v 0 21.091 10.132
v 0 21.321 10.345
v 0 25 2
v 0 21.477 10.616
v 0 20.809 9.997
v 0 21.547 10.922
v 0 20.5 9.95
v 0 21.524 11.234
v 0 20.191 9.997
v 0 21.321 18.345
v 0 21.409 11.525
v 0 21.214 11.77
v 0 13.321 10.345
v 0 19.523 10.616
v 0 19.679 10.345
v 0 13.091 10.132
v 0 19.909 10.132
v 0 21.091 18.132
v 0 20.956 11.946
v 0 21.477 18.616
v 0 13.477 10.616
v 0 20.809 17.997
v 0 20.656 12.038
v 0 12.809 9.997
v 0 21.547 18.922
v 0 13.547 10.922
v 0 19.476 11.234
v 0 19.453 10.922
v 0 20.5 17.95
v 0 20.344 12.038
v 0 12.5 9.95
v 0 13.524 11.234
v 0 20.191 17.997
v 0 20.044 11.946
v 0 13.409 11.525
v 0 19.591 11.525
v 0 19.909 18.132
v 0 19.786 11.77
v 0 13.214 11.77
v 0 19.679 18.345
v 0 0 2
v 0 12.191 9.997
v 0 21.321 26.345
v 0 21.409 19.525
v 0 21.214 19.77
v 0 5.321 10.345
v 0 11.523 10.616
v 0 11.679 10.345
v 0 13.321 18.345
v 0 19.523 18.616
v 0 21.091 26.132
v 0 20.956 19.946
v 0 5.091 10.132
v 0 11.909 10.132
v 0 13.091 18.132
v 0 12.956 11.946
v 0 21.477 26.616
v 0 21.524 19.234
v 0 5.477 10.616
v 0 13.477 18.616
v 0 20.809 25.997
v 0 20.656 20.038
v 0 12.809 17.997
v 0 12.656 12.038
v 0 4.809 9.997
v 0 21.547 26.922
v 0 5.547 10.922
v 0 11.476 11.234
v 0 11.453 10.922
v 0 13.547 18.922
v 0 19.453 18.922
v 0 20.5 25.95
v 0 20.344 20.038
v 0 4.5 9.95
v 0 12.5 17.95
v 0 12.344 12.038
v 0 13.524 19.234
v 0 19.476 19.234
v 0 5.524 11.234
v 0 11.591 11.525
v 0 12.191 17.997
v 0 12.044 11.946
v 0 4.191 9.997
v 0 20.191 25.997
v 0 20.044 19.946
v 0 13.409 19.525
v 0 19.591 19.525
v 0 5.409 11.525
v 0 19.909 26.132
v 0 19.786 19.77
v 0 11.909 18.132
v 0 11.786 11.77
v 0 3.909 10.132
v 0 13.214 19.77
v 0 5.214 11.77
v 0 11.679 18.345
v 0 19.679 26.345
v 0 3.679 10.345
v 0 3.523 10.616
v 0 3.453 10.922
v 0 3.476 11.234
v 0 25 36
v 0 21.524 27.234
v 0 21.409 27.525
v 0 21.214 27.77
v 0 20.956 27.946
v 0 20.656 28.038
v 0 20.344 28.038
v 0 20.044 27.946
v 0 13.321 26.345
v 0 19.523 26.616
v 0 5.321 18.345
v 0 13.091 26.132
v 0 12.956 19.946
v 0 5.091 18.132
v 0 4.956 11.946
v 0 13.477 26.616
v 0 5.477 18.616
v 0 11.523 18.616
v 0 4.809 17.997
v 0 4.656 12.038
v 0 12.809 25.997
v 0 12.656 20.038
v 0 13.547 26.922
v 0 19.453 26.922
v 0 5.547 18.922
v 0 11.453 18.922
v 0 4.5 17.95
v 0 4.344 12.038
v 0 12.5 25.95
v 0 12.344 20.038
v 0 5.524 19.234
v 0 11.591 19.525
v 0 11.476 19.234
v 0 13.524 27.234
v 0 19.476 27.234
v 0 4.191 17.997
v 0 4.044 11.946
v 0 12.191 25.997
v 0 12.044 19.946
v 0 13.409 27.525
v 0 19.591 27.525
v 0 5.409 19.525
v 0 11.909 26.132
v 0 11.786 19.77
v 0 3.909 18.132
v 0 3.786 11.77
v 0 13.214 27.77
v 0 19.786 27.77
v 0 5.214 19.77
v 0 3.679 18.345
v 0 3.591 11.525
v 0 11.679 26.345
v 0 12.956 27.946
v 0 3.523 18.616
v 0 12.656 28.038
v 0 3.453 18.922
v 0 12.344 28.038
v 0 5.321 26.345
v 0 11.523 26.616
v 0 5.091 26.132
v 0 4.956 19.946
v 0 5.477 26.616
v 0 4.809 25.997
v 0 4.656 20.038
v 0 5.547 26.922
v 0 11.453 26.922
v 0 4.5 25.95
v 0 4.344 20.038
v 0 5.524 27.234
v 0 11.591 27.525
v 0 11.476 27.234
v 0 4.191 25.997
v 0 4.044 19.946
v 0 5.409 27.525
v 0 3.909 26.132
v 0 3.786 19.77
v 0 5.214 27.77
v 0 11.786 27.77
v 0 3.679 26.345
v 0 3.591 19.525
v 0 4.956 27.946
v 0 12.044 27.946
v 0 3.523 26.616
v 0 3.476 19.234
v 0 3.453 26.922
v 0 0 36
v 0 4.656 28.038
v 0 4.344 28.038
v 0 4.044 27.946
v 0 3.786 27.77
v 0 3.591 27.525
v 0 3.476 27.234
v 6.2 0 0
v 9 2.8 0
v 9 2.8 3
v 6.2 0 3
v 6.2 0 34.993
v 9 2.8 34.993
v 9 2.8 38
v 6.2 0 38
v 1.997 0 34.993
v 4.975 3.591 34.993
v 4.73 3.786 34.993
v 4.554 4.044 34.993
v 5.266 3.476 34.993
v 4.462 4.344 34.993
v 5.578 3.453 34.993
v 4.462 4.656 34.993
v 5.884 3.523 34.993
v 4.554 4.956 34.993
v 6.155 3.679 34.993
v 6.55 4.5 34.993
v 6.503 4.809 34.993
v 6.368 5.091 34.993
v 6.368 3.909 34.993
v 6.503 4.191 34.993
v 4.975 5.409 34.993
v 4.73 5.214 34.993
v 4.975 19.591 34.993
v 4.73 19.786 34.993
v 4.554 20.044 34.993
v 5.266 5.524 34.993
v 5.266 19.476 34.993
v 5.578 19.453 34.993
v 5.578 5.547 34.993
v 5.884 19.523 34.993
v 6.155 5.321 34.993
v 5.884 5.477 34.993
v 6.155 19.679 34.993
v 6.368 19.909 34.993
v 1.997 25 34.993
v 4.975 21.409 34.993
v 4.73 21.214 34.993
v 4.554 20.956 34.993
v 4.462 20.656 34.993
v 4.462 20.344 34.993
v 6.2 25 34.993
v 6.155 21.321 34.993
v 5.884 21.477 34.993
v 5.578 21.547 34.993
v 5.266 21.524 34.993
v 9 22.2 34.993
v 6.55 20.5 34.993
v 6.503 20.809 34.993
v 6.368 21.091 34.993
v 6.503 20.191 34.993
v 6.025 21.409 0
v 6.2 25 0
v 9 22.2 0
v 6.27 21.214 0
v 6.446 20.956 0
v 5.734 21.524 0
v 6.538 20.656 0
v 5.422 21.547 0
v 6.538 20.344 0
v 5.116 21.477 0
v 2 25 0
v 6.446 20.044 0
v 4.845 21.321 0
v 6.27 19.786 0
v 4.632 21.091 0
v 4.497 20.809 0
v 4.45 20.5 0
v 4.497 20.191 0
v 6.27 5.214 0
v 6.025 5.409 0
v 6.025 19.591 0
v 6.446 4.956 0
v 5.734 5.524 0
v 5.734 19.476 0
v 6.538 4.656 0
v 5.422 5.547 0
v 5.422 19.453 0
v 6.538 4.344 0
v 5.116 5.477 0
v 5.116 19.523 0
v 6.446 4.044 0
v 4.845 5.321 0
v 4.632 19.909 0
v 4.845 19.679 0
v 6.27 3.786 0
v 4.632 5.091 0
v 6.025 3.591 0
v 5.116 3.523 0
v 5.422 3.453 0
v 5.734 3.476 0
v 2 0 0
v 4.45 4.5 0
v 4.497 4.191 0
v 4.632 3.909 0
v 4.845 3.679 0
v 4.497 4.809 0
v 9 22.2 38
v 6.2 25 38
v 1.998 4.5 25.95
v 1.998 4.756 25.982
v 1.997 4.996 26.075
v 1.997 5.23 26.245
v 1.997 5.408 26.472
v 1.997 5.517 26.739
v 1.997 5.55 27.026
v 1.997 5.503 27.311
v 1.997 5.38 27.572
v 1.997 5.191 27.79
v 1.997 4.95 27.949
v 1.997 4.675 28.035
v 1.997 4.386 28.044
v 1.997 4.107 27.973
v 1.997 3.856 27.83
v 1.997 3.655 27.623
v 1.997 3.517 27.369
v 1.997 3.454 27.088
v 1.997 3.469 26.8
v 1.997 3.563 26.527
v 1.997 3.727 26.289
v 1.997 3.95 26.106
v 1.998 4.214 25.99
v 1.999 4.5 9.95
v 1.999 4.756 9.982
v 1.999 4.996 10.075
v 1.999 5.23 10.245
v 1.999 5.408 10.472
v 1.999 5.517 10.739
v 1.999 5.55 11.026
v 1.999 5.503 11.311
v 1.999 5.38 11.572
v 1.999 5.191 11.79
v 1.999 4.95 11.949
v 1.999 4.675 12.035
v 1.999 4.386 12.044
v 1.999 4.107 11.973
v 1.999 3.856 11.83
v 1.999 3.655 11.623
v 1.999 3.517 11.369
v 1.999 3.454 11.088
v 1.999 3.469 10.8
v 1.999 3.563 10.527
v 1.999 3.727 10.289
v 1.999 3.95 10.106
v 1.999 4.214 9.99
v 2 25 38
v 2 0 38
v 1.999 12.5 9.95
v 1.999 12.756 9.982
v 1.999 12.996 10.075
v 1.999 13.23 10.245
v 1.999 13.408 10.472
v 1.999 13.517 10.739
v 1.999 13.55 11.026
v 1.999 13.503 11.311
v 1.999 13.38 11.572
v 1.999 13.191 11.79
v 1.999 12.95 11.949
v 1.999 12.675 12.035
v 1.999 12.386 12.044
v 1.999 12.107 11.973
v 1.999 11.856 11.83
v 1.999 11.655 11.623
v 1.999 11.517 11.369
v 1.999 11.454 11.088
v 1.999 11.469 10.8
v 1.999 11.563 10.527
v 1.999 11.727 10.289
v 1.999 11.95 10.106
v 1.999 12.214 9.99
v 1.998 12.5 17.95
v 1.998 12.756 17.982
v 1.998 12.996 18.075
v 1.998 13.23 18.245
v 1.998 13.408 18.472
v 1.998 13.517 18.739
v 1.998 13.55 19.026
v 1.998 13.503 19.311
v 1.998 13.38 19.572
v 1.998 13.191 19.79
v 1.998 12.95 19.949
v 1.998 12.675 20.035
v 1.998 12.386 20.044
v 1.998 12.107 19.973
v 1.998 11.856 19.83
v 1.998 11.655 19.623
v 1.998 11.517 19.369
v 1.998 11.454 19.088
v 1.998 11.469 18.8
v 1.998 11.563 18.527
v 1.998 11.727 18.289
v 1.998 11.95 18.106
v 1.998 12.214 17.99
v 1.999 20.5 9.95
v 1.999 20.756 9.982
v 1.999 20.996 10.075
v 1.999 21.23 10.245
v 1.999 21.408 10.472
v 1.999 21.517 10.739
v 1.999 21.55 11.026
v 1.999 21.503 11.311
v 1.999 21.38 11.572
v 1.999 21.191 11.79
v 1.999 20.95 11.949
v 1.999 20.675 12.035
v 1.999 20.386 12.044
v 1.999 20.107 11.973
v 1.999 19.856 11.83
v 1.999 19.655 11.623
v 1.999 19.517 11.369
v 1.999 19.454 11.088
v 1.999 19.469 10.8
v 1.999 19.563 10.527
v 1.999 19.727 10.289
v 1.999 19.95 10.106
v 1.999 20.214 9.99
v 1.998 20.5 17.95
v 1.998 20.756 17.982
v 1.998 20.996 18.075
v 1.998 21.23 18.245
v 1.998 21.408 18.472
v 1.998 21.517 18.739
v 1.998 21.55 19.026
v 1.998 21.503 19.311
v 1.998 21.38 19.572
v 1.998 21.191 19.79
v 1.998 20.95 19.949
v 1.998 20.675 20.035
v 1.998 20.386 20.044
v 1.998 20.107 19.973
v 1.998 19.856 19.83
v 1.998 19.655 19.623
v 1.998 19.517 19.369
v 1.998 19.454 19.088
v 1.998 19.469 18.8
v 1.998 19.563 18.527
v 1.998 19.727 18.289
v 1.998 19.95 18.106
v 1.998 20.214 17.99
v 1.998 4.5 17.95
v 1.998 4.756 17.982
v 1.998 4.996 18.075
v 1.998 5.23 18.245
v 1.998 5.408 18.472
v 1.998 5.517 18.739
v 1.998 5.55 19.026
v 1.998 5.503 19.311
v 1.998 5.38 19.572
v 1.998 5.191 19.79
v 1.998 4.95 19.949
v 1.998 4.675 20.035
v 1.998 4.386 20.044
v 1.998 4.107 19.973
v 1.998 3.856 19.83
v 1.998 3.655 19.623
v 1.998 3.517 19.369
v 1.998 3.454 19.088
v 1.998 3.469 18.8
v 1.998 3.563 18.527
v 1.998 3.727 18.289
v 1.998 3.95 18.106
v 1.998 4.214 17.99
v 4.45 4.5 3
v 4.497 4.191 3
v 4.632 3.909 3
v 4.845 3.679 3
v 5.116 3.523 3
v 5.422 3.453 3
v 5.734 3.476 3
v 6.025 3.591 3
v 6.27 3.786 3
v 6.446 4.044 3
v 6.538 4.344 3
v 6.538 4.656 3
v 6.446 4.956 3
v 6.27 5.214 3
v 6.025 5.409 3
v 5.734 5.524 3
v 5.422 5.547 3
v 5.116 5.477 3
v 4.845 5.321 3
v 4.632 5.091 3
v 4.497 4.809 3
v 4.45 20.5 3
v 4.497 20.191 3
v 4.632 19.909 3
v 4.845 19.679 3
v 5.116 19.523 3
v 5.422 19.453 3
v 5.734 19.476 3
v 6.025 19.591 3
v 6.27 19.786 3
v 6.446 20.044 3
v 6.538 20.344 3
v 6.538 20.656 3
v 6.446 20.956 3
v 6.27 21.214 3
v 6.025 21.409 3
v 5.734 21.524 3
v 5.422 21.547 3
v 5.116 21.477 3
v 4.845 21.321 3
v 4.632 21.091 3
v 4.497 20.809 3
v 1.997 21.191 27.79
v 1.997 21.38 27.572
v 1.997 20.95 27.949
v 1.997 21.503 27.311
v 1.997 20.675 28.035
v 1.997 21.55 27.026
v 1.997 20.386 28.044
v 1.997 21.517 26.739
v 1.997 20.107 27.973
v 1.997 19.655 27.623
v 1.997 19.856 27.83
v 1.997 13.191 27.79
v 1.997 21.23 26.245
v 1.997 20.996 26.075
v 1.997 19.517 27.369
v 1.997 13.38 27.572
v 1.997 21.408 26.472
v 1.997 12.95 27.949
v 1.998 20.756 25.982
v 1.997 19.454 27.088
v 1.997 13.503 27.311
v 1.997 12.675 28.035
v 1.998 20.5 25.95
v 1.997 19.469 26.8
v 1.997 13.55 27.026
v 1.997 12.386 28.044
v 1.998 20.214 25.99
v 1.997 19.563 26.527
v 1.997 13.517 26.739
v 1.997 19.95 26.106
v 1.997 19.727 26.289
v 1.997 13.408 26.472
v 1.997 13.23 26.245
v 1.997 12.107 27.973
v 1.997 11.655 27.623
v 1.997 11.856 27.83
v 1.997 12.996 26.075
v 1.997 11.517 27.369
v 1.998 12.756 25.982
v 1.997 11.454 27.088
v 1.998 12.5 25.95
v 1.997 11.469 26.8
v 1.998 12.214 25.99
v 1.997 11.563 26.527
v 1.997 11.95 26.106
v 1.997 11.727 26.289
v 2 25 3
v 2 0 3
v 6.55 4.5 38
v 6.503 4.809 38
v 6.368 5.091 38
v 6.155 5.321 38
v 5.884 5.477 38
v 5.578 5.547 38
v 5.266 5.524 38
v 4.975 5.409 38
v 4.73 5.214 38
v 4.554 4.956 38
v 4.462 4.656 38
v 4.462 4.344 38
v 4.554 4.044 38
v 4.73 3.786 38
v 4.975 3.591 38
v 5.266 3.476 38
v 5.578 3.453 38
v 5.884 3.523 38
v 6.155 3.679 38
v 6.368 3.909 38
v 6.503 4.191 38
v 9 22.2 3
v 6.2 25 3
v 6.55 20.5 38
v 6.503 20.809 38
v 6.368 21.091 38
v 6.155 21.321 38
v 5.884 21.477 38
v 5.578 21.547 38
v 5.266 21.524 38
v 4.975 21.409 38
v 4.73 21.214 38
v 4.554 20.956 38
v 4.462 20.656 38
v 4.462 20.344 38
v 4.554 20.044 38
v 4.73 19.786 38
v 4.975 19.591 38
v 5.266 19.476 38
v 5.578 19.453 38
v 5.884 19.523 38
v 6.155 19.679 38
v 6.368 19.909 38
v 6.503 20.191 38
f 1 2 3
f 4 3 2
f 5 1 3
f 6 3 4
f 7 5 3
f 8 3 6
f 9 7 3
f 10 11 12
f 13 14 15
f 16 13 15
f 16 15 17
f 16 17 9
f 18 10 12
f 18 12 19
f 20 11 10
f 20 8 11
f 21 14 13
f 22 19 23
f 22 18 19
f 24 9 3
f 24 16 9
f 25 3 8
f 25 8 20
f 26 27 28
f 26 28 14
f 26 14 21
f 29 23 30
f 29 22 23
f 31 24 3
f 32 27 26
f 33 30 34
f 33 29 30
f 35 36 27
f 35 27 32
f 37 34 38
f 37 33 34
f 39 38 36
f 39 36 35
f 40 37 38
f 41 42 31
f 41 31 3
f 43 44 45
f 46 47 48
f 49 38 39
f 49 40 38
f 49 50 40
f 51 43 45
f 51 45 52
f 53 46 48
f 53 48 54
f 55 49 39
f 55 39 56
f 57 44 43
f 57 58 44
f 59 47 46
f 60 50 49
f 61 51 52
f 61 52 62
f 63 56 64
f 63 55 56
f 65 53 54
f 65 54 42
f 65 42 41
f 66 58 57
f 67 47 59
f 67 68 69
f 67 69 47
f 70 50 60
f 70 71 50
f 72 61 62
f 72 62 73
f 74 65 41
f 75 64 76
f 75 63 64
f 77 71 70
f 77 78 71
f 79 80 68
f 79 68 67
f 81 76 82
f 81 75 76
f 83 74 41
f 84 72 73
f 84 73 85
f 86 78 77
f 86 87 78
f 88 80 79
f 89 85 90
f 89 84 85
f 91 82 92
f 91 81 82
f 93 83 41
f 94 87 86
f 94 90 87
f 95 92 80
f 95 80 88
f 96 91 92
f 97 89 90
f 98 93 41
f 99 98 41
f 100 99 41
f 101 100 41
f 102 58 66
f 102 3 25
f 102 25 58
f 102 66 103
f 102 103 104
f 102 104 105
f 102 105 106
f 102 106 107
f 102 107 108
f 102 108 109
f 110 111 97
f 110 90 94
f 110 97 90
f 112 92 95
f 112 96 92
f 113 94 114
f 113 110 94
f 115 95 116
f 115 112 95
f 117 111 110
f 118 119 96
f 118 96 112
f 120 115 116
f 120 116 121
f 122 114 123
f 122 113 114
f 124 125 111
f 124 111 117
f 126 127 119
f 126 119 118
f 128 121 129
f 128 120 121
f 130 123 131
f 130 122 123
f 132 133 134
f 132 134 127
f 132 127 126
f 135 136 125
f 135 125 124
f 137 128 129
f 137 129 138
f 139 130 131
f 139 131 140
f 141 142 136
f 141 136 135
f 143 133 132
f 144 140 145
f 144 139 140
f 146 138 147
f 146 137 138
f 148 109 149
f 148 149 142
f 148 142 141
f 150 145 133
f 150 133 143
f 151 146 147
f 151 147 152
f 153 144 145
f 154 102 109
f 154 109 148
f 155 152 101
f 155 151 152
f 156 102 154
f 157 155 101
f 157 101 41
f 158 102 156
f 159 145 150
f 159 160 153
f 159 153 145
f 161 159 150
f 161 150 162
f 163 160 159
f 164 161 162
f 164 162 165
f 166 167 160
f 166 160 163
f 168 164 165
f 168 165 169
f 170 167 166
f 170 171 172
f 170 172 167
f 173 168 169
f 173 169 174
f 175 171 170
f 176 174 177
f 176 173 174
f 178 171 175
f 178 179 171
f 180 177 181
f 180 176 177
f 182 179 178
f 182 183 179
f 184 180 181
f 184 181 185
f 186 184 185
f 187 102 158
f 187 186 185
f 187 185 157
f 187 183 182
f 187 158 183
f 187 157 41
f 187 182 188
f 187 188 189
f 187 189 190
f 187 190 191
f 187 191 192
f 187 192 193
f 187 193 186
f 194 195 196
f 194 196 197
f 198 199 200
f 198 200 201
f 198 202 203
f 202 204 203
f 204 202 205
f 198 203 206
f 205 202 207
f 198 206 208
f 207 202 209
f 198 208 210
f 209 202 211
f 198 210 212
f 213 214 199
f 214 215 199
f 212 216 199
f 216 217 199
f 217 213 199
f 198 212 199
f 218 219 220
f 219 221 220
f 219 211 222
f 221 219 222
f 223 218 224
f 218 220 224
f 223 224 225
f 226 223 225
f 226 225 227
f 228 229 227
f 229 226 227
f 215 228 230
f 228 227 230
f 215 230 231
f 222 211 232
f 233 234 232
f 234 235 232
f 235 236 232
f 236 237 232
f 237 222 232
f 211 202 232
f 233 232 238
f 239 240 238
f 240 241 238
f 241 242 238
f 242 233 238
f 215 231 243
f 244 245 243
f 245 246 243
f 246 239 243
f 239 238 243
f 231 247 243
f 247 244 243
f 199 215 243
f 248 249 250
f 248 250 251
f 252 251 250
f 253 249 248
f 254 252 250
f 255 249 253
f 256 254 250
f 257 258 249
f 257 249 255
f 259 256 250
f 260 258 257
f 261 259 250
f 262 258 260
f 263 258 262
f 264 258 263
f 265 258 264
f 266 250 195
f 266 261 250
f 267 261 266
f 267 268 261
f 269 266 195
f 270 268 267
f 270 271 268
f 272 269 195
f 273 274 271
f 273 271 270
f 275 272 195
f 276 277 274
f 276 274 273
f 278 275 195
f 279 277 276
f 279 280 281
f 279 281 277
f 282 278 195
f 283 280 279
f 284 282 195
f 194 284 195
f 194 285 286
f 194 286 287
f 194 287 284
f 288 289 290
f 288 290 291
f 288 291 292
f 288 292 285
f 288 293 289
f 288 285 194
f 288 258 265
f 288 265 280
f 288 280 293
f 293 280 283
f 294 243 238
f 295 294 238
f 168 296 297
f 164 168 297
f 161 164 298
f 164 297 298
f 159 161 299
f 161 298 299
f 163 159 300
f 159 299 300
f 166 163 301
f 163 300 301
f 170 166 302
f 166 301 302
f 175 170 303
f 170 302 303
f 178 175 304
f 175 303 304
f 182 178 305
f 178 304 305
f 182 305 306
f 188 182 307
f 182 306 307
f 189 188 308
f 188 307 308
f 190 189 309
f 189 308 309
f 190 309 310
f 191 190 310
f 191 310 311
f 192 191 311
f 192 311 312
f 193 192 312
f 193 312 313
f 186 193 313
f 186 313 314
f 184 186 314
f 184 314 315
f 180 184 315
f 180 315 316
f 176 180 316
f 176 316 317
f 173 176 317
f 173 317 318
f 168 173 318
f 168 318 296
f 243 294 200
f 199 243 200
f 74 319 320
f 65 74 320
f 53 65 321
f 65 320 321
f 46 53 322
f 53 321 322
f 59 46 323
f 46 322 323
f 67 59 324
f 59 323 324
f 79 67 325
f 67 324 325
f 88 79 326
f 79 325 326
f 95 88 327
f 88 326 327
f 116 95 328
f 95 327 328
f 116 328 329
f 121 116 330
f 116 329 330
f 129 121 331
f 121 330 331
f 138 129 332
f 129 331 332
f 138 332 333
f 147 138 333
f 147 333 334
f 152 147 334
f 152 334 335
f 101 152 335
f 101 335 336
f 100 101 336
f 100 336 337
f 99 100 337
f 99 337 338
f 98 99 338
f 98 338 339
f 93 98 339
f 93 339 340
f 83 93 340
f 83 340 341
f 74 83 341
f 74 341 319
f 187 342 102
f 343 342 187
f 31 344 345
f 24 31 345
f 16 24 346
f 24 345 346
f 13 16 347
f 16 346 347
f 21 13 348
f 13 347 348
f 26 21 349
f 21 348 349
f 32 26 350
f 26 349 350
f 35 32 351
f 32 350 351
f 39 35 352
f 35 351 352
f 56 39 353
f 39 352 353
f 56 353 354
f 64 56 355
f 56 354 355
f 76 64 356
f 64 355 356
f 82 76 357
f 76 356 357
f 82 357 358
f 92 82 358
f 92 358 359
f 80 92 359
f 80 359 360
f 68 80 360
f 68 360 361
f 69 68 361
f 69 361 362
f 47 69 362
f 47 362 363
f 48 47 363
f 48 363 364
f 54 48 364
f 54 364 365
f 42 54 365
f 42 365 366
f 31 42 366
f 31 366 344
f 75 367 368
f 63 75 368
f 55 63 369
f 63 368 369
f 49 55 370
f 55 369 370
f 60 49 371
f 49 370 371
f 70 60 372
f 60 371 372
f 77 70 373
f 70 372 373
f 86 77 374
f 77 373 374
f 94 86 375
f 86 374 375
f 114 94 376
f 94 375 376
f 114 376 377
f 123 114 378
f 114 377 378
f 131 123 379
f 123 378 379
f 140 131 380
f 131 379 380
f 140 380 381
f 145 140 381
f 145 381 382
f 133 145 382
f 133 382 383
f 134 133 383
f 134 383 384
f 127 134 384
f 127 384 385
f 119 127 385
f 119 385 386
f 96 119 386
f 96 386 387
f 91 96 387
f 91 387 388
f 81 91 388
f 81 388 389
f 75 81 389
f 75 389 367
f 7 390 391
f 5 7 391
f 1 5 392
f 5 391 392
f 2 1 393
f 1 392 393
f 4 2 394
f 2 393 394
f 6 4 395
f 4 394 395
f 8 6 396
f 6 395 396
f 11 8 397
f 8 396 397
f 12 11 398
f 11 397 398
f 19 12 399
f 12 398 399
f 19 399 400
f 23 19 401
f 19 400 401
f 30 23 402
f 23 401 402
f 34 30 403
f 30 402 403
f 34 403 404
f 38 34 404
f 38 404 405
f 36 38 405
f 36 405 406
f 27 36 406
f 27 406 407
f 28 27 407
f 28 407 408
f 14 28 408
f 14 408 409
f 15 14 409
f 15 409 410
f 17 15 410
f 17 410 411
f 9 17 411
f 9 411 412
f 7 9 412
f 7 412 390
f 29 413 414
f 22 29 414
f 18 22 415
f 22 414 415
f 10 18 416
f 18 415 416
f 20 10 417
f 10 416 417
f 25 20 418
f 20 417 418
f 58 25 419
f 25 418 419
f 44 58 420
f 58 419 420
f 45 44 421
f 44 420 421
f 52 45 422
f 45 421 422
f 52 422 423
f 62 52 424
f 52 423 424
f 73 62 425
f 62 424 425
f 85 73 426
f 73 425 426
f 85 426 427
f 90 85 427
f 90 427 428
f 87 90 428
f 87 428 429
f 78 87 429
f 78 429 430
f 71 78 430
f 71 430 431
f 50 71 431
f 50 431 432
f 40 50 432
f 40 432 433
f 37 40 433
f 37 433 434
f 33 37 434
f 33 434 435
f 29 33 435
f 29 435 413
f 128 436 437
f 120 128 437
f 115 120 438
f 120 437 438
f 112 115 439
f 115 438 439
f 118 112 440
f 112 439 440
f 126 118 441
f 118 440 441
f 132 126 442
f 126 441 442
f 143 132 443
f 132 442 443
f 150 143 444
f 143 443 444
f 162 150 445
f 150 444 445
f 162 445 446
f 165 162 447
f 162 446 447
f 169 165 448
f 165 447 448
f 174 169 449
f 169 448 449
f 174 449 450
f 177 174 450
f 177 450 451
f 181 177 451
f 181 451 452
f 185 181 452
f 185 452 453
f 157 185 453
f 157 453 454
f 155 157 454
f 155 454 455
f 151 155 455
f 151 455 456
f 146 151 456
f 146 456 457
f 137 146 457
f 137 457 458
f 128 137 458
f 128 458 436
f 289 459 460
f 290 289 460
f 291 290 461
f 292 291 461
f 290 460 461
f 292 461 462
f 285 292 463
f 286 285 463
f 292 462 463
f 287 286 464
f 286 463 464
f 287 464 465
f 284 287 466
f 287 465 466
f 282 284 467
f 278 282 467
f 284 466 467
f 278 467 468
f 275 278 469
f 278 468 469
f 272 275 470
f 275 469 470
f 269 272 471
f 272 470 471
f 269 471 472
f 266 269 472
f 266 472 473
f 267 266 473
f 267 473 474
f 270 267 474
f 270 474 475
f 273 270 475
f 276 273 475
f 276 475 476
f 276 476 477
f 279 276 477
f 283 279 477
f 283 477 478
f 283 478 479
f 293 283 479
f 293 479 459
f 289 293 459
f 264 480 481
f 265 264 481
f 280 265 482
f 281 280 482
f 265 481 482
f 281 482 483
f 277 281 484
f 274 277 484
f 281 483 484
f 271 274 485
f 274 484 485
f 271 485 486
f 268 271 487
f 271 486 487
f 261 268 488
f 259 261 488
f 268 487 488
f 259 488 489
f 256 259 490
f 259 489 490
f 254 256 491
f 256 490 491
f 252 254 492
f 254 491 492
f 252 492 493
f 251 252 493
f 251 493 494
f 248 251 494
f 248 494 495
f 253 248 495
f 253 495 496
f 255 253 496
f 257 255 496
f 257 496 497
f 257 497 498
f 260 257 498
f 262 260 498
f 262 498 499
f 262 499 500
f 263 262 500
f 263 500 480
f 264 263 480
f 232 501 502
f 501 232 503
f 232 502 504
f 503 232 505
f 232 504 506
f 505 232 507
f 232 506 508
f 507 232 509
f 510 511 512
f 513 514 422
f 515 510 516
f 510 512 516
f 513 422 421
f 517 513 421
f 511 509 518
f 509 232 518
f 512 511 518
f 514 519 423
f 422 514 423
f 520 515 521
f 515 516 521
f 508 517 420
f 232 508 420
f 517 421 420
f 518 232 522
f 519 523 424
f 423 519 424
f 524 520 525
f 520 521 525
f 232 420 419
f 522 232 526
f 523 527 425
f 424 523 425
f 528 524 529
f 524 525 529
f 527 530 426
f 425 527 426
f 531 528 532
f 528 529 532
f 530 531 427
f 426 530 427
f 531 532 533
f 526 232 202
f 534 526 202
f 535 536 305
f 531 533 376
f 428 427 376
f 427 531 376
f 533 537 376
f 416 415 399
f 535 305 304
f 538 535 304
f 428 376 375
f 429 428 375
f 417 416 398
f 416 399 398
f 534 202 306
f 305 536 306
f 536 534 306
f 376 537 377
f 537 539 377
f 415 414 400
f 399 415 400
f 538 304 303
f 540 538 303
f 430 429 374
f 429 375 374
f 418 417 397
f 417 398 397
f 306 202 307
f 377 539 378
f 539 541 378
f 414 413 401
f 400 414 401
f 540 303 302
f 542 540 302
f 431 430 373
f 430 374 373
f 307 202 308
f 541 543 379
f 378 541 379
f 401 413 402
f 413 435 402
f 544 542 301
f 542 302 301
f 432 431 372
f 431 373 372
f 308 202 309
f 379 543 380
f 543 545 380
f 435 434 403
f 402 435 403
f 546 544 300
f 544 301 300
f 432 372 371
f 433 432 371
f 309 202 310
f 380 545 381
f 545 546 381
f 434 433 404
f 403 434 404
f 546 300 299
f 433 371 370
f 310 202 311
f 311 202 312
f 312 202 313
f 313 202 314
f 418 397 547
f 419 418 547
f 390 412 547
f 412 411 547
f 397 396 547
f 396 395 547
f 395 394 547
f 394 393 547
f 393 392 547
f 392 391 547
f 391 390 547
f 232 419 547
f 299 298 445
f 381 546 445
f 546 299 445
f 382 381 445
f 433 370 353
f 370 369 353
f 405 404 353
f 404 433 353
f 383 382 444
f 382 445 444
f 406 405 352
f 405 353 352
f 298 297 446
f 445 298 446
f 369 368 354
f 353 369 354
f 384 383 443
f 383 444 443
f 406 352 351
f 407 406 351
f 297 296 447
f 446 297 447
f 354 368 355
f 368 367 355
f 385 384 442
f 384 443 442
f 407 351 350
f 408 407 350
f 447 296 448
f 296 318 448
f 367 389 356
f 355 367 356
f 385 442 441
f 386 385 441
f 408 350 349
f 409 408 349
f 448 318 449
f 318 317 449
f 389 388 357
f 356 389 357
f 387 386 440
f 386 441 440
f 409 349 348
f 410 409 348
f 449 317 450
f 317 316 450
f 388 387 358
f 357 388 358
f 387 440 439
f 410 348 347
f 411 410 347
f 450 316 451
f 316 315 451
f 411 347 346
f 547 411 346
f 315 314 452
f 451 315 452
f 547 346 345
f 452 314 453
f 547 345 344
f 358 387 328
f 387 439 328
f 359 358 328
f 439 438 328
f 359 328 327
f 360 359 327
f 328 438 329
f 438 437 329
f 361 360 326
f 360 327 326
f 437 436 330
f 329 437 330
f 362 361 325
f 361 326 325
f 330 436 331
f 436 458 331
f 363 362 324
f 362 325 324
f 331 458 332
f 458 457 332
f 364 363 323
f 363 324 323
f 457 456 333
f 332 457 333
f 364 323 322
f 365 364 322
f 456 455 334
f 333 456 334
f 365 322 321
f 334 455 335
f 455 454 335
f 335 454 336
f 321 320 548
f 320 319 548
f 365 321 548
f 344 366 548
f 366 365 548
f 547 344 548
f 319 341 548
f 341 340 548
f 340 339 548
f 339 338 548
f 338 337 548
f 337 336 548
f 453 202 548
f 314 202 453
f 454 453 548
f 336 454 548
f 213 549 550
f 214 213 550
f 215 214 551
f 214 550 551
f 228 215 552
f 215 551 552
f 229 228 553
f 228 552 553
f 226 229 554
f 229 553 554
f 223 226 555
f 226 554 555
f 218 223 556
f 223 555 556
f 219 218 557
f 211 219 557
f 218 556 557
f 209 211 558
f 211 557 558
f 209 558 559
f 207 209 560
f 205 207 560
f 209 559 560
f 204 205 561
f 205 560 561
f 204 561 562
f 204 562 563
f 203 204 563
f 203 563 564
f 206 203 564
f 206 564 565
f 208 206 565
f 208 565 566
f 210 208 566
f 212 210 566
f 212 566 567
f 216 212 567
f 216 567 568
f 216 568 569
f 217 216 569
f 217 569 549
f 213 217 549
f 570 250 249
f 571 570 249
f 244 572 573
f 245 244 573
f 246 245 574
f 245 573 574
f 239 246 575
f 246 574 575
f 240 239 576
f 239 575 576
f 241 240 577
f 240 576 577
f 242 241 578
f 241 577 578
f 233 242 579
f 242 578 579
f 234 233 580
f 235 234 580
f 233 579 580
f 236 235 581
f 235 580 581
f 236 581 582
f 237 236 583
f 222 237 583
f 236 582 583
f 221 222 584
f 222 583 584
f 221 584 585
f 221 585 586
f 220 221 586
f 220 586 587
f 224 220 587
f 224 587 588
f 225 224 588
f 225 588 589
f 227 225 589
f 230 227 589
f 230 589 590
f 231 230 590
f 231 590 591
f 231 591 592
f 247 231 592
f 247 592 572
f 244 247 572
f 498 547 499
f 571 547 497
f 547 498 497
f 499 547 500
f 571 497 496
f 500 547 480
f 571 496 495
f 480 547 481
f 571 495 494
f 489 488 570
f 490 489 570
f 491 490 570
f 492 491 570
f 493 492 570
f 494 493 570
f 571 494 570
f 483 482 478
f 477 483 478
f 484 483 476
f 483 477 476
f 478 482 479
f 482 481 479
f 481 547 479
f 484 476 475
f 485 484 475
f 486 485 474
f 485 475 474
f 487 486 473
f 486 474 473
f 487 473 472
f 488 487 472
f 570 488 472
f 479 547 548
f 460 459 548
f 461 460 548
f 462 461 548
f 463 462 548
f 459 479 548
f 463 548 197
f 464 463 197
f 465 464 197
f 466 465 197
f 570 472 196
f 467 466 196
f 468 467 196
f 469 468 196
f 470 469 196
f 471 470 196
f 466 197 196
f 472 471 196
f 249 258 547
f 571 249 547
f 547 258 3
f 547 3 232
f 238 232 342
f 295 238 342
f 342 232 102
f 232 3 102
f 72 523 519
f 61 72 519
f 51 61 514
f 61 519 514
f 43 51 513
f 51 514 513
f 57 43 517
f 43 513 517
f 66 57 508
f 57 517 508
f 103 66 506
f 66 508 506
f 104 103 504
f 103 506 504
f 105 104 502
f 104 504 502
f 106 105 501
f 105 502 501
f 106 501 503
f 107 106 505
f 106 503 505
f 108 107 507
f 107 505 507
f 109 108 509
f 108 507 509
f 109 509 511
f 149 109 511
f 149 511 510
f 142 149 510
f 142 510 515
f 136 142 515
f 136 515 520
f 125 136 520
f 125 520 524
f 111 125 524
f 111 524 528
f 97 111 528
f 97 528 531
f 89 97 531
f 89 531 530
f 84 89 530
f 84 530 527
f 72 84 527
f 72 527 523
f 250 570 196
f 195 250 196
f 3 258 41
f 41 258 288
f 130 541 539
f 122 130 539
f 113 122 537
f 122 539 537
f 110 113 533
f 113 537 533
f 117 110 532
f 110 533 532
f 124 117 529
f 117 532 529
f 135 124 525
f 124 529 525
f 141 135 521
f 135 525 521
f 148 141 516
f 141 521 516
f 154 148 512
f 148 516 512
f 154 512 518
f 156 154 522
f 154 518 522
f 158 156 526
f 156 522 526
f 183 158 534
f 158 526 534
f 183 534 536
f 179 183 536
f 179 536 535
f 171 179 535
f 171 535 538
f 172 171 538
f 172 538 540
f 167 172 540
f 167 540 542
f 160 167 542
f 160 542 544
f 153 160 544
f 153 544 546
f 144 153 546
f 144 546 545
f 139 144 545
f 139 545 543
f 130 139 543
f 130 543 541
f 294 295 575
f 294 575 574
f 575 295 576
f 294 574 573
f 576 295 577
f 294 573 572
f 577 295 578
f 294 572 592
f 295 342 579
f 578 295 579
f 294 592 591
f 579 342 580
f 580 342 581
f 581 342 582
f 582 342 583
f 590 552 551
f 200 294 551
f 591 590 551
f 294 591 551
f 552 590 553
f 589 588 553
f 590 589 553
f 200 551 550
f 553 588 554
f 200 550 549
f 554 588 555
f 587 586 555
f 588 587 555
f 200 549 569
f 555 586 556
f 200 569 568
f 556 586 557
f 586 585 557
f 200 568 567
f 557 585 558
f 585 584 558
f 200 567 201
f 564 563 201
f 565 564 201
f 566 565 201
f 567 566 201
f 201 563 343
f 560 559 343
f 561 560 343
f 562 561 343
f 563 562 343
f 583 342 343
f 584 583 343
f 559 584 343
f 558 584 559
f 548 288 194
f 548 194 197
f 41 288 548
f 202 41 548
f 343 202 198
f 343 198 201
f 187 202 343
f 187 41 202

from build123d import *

# Parameters (mm, degrees)
SKETCH_1_W                  = 25
SKETCH_1_H                  = 38
EXTRUDE_1_DEPTH             = 9
CUT_EXTRUDE_1_DEPTH         = 47.368092477
HOLE_WIZARD_2_1_2_1_1_D     = 2.1
HOLE_WIZARD_2_1_2_1_1_DEPTH = 9
HOLE_WIZARD_2_1_2_1_2_D     = 2.1
HOLE_WIZARD_2_1_2_1_2_DEPTH = 9
HOLE_WIZARD_2_1_2_1_3_D     = 2.1
HOLE_WIZARD_2_1_2_1_3_DEPTH = 9
HOLE_WIZARD_2_1_2_1_4_D     = 2.1
HOLE_WIZARD_2_1_2_1_4_DEPTH = 3.007193387
CHAMFER_1_SIZE              = 2
SKETCH_12_R                 = 1.05
CUT_EXTRUDE_2_DEPTH         = 10
SKETCH_15_R                 = 1.05
CUT_EXTRUDE_3_DEPTH         = 10
CUT_EXTRUDE_4_DEPTH         = 47.368092478
CUT_EXTRUDE_5_DEPTH         = 47.368092477
CUT_EXTRUDE_5_DEPTH_BACK    = 47.368092477


with BuildPart() as part:
    # 草图1 → 凸台-拉伸1 (new body)
    with BuildSketch(Plane(origin=(0, 0, 0), x_dir=(0, -1, 0), z_dir=(-1, 0, 0))):
        with Locations((-12.5, 19)):
            Rectangle(SKETCH_1_W, SKETCH_1_H)
    extrude(amount=-EXTRUDE_1_DEPTH)

    # 草图2 → 切除-拉伸1 (cut, through all)
    with BuildSketch(Plane(origin=(0, 25, 0), x_dir=(-1, 0, 0), z_dir=(0, 1, 0))):
        Polygon((-9, 3), (-4, 3), (-3.996522166, 5.080336705), (-3.996522166, 33.000000217), (-3.996522166, 34.992806613), (-9, 34.992806613), align=None)
    extrude(amount=-CUT_EXTRUDE_1_DEPTH, mode=Mode.SUBTRACT)

    # Ø2.1 (2.1) 直径孔1
    with Locations(Plane.ZY):
        with Locations((11, 4.5)):
            Hole(HOLE_WIZARD_2_1_2_1_1_D / 2, depth=HOLE_WIZARD_2_1_2_1_1_DEPTH)

    # Ø2.1 (2.1) 直径孔2
    with Locations(Plane.ZY):
        with Locations((19, 4.5)):
            Hole(HOLE_WIZARD_2_1_2_1_2_D / 2, depth=HOLE_WIZARD_2_1_2_1_2_DEPTH)

    # Ø2.1 (2.1) 直径孔3
    with Locations(Plane.ZY):
        with Locations((27, 4.5), (27, 12.5), (27, 20.5), (11, 12.5), (11, 20.5), (19, 20.5), (19, 12.5)):
            Hole(HOLE_WIZARD_2_1_2_1_3_D / 2, depth=HOLE_WIZARD_2_1_2_1_3_DEPTH)

    # Ø2.1 (2.1) 直径孔4
    with Locations(Plane(origin=(0, 0, 34.992806613), x_dir=(-1, 0, 0), z_dir=(0, 0, -1))):
        with Locations((-5.5, 4.5), (-5.5, 20.5)):
            Hole(HOLE_WIZARD_2_1_2_1_4_D / 2, depth=HOLE_WIZARD_2_1_2_1_4_DEPTH)

    # 倒角1
    chamfer_1_edges = [part.edges().sort_by_distance(p)[0] for p in [
        (0, 12.5, 0),
        (0, 12.5, 38),
    ]]
    chamfer(chamfer_1_edges, length=CHAMFER_1_SIZE)

    # 草图12 → 切除-拉伸2 (cut)
    with BuildSketch(Plane.XY.offset(3)):
        with Locations(Location((5.5, 4.5, 0), (0, 0, 180))):
            Circle(SKETCH_12_R)
    extrude(amount=-CUT_EXTRUDE_2_DEPTH, mode=Mode.SUBTRACT)

    # 草图15 → 切除-拉伸3 (cut)
    with BuildSketch(Plane.XY.offset(3)):
        with Locations(Location((5.5, 20.5, 0), (0, 0, 180))):
            Circle(SKETCH_15_R)
    extrude(amount=-CUT_EXTRUDE_3_DEPTH, mode=Mode.SUBTRACT)

    # 草图16 → 切除-拉伸4 (cut, through all)
    with BuildSketch(Plane.XZ):
        Polygon((3.996522166, 34.992806613), (1.996522166, 34.992806613), (2, 3), (4, 3), align=None)
    extrude(amount=-CUT_EXTRUDE_4_DEPTH, mode=Mode.SUBTRACT)

    # 草图17 → 切除-拉伸5 (cut, two sides: drawn at the far end of the back side and taken through both)
    with BuildSketch(Plane.XY.offset(38).offset(-CUT_EXTRUDE_5_DEPTH_BACK)):
        Polygon((9, 22.2), (6.2, 25), (9, 25), align=None)
        Polygon((9, 0), (9, 2.8), (6.2, 0), align=None)
    extrude(amount=CUT_EXTRUDE_5_DEPTH + CUT_EXTRUDE_5_DEPTH_BACK, mode=Mode.SUBTRACT)


solid = part.part
